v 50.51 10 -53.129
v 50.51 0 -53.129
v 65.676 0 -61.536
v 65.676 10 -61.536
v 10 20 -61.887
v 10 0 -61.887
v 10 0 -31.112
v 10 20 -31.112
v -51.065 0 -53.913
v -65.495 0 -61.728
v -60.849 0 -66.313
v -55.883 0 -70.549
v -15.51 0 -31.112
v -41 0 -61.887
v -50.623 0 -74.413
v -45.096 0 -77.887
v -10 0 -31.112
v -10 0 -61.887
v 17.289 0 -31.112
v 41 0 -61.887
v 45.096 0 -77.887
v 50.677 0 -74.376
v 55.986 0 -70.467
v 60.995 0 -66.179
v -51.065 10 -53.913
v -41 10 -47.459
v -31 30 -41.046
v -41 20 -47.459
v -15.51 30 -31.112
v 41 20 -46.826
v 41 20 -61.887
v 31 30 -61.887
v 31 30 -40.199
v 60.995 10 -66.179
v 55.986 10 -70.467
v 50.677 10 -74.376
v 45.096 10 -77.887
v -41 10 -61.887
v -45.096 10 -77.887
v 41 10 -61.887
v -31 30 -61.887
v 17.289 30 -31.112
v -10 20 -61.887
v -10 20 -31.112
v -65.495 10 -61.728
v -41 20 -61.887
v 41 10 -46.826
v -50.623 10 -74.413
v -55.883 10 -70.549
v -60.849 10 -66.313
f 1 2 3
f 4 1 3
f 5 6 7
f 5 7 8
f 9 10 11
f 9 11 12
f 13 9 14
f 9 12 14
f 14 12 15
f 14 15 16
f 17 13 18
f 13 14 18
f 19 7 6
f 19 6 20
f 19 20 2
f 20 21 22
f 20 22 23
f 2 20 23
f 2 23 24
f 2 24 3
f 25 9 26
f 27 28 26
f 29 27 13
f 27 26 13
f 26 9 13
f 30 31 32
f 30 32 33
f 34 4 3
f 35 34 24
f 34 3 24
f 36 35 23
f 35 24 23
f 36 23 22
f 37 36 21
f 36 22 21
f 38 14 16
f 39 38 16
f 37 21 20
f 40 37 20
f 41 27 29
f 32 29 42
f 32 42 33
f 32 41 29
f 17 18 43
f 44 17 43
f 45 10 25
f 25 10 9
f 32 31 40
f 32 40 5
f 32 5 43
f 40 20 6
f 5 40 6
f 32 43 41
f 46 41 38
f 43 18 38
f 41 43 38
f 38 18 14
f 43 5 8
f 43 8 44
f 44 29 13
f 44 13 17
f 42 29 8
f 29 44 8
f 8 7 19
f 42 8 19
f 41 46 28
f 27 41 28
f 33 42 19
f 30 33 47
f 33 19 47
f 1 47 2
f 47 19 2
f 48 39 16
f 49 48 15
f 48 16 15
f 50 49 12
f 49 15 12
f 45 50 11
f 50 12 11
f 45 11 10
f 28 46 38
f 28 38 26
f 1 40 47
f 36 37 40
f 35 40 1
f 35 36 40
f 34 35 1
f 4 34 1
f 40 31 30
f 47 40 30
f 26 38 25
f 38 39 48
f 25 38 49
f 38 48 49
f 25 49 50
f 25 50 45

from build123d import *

# Parameters (mm, degrees)
BOSS_EXTRUDE1_DEPTH = 30
CUT_EXTRUDE1_DEPTH  = 20
CHAMFER1_SIZE       = 10
SKETCH4_W           = 20
SKETCH4_H           = 20
CUT_EXTRUDE2_DEPTH  = 41.358334189


with BuildPart() as part:
    # Sketch1 → Boss-Extrude1 (new body)
    with BuildSketch(Plane(origin=(0, 0, 0), x_dir=(1, 0, 0), z_dir=(0, 1, 0))):
        with BuildLine():
            Line((-65.495262312, 61.728199509), (-51.064892932, 53.913448014))
            Line((-51.064892932, 53.913448014), (-15.510423608, 31.112009379))
            Line((-15.510423608, 31.112009379), (17.288542893, 31.112009379))
            Line((17.288542893, 31.112009379), (50.510402672, 53.128986682))
            Line((50.510402672, 53.128986682), (65.676291813, 61.535556337))
            ThreePointArc((65.676291813, 61.535556337), (55.986333501, 70.466520143), (45.096073772, 77.886739118))
            Line((45.096073772, 77.886739118), (41, 61.886739118))
            Line((41, 61.886739118), (-41, 61.886739118))
            Line((-41, 61.886739118), (-45.096073772, 77.886739118))
            ThreePointArc((-45.096073772, 77.886739118), (-55.882783617, 70.548667565), (-65.495262312, 61.728199509))
        make_face()
    extrude(amount=BOSS_EXTRUDE1_DEPTH)

    # Sketch3 → Cut-Extrude1 (cut)
    with BuildSketch(Plane(origin=(0, 30, 0), x_dir=(1, 0, 0), z_dir=(0, 1, 0))):
        Polygon((41, 61.886739118), (41, 39.992019881), (77.260525415, 39.992019881), (80.602533751, 99.084803638), (39.738886371, 90.425963859), align=None)
    cut_extrude1 = extrude(amount=-CUT_EXTRUDE1_DEPTH, mode=Mode.SUBTRACT)

    # Mirror1: Cut-Extrude1 across plane
    add(cut_extrude1.mirror(Plane(origin=(0, 0, 0), x_dir=(0, 0, 1), z_dir=(1, 0, 0))), mode=Mode.SUBTRACT)

    # Chamfer1
    chamfer1_edges = [part.edges().sort_by_distance(p)[0] for p in [
        (41, 30, -54.356469192),
        (-41, 30, -54.672735052),
    ]]
    chamfer(chamfer1_edges, length=CHAMFER1_SIZE)

    # Sketch4 → Cut-Extrude2 (cut)
    with BuildSketch(Plane(origin=(0, 0, -61.886739118), x_dir=(-1, 0, 0), z_dir=(0, 0, -1))):
        with Locations((0, 10)):
            Rectangle(SKETCH4_W, SKETCH4_H)
    extrude(amount=-CUT_EXTRUDE2_DEPTH, mode=Mode.SUBTRACT)


solid = part.part
